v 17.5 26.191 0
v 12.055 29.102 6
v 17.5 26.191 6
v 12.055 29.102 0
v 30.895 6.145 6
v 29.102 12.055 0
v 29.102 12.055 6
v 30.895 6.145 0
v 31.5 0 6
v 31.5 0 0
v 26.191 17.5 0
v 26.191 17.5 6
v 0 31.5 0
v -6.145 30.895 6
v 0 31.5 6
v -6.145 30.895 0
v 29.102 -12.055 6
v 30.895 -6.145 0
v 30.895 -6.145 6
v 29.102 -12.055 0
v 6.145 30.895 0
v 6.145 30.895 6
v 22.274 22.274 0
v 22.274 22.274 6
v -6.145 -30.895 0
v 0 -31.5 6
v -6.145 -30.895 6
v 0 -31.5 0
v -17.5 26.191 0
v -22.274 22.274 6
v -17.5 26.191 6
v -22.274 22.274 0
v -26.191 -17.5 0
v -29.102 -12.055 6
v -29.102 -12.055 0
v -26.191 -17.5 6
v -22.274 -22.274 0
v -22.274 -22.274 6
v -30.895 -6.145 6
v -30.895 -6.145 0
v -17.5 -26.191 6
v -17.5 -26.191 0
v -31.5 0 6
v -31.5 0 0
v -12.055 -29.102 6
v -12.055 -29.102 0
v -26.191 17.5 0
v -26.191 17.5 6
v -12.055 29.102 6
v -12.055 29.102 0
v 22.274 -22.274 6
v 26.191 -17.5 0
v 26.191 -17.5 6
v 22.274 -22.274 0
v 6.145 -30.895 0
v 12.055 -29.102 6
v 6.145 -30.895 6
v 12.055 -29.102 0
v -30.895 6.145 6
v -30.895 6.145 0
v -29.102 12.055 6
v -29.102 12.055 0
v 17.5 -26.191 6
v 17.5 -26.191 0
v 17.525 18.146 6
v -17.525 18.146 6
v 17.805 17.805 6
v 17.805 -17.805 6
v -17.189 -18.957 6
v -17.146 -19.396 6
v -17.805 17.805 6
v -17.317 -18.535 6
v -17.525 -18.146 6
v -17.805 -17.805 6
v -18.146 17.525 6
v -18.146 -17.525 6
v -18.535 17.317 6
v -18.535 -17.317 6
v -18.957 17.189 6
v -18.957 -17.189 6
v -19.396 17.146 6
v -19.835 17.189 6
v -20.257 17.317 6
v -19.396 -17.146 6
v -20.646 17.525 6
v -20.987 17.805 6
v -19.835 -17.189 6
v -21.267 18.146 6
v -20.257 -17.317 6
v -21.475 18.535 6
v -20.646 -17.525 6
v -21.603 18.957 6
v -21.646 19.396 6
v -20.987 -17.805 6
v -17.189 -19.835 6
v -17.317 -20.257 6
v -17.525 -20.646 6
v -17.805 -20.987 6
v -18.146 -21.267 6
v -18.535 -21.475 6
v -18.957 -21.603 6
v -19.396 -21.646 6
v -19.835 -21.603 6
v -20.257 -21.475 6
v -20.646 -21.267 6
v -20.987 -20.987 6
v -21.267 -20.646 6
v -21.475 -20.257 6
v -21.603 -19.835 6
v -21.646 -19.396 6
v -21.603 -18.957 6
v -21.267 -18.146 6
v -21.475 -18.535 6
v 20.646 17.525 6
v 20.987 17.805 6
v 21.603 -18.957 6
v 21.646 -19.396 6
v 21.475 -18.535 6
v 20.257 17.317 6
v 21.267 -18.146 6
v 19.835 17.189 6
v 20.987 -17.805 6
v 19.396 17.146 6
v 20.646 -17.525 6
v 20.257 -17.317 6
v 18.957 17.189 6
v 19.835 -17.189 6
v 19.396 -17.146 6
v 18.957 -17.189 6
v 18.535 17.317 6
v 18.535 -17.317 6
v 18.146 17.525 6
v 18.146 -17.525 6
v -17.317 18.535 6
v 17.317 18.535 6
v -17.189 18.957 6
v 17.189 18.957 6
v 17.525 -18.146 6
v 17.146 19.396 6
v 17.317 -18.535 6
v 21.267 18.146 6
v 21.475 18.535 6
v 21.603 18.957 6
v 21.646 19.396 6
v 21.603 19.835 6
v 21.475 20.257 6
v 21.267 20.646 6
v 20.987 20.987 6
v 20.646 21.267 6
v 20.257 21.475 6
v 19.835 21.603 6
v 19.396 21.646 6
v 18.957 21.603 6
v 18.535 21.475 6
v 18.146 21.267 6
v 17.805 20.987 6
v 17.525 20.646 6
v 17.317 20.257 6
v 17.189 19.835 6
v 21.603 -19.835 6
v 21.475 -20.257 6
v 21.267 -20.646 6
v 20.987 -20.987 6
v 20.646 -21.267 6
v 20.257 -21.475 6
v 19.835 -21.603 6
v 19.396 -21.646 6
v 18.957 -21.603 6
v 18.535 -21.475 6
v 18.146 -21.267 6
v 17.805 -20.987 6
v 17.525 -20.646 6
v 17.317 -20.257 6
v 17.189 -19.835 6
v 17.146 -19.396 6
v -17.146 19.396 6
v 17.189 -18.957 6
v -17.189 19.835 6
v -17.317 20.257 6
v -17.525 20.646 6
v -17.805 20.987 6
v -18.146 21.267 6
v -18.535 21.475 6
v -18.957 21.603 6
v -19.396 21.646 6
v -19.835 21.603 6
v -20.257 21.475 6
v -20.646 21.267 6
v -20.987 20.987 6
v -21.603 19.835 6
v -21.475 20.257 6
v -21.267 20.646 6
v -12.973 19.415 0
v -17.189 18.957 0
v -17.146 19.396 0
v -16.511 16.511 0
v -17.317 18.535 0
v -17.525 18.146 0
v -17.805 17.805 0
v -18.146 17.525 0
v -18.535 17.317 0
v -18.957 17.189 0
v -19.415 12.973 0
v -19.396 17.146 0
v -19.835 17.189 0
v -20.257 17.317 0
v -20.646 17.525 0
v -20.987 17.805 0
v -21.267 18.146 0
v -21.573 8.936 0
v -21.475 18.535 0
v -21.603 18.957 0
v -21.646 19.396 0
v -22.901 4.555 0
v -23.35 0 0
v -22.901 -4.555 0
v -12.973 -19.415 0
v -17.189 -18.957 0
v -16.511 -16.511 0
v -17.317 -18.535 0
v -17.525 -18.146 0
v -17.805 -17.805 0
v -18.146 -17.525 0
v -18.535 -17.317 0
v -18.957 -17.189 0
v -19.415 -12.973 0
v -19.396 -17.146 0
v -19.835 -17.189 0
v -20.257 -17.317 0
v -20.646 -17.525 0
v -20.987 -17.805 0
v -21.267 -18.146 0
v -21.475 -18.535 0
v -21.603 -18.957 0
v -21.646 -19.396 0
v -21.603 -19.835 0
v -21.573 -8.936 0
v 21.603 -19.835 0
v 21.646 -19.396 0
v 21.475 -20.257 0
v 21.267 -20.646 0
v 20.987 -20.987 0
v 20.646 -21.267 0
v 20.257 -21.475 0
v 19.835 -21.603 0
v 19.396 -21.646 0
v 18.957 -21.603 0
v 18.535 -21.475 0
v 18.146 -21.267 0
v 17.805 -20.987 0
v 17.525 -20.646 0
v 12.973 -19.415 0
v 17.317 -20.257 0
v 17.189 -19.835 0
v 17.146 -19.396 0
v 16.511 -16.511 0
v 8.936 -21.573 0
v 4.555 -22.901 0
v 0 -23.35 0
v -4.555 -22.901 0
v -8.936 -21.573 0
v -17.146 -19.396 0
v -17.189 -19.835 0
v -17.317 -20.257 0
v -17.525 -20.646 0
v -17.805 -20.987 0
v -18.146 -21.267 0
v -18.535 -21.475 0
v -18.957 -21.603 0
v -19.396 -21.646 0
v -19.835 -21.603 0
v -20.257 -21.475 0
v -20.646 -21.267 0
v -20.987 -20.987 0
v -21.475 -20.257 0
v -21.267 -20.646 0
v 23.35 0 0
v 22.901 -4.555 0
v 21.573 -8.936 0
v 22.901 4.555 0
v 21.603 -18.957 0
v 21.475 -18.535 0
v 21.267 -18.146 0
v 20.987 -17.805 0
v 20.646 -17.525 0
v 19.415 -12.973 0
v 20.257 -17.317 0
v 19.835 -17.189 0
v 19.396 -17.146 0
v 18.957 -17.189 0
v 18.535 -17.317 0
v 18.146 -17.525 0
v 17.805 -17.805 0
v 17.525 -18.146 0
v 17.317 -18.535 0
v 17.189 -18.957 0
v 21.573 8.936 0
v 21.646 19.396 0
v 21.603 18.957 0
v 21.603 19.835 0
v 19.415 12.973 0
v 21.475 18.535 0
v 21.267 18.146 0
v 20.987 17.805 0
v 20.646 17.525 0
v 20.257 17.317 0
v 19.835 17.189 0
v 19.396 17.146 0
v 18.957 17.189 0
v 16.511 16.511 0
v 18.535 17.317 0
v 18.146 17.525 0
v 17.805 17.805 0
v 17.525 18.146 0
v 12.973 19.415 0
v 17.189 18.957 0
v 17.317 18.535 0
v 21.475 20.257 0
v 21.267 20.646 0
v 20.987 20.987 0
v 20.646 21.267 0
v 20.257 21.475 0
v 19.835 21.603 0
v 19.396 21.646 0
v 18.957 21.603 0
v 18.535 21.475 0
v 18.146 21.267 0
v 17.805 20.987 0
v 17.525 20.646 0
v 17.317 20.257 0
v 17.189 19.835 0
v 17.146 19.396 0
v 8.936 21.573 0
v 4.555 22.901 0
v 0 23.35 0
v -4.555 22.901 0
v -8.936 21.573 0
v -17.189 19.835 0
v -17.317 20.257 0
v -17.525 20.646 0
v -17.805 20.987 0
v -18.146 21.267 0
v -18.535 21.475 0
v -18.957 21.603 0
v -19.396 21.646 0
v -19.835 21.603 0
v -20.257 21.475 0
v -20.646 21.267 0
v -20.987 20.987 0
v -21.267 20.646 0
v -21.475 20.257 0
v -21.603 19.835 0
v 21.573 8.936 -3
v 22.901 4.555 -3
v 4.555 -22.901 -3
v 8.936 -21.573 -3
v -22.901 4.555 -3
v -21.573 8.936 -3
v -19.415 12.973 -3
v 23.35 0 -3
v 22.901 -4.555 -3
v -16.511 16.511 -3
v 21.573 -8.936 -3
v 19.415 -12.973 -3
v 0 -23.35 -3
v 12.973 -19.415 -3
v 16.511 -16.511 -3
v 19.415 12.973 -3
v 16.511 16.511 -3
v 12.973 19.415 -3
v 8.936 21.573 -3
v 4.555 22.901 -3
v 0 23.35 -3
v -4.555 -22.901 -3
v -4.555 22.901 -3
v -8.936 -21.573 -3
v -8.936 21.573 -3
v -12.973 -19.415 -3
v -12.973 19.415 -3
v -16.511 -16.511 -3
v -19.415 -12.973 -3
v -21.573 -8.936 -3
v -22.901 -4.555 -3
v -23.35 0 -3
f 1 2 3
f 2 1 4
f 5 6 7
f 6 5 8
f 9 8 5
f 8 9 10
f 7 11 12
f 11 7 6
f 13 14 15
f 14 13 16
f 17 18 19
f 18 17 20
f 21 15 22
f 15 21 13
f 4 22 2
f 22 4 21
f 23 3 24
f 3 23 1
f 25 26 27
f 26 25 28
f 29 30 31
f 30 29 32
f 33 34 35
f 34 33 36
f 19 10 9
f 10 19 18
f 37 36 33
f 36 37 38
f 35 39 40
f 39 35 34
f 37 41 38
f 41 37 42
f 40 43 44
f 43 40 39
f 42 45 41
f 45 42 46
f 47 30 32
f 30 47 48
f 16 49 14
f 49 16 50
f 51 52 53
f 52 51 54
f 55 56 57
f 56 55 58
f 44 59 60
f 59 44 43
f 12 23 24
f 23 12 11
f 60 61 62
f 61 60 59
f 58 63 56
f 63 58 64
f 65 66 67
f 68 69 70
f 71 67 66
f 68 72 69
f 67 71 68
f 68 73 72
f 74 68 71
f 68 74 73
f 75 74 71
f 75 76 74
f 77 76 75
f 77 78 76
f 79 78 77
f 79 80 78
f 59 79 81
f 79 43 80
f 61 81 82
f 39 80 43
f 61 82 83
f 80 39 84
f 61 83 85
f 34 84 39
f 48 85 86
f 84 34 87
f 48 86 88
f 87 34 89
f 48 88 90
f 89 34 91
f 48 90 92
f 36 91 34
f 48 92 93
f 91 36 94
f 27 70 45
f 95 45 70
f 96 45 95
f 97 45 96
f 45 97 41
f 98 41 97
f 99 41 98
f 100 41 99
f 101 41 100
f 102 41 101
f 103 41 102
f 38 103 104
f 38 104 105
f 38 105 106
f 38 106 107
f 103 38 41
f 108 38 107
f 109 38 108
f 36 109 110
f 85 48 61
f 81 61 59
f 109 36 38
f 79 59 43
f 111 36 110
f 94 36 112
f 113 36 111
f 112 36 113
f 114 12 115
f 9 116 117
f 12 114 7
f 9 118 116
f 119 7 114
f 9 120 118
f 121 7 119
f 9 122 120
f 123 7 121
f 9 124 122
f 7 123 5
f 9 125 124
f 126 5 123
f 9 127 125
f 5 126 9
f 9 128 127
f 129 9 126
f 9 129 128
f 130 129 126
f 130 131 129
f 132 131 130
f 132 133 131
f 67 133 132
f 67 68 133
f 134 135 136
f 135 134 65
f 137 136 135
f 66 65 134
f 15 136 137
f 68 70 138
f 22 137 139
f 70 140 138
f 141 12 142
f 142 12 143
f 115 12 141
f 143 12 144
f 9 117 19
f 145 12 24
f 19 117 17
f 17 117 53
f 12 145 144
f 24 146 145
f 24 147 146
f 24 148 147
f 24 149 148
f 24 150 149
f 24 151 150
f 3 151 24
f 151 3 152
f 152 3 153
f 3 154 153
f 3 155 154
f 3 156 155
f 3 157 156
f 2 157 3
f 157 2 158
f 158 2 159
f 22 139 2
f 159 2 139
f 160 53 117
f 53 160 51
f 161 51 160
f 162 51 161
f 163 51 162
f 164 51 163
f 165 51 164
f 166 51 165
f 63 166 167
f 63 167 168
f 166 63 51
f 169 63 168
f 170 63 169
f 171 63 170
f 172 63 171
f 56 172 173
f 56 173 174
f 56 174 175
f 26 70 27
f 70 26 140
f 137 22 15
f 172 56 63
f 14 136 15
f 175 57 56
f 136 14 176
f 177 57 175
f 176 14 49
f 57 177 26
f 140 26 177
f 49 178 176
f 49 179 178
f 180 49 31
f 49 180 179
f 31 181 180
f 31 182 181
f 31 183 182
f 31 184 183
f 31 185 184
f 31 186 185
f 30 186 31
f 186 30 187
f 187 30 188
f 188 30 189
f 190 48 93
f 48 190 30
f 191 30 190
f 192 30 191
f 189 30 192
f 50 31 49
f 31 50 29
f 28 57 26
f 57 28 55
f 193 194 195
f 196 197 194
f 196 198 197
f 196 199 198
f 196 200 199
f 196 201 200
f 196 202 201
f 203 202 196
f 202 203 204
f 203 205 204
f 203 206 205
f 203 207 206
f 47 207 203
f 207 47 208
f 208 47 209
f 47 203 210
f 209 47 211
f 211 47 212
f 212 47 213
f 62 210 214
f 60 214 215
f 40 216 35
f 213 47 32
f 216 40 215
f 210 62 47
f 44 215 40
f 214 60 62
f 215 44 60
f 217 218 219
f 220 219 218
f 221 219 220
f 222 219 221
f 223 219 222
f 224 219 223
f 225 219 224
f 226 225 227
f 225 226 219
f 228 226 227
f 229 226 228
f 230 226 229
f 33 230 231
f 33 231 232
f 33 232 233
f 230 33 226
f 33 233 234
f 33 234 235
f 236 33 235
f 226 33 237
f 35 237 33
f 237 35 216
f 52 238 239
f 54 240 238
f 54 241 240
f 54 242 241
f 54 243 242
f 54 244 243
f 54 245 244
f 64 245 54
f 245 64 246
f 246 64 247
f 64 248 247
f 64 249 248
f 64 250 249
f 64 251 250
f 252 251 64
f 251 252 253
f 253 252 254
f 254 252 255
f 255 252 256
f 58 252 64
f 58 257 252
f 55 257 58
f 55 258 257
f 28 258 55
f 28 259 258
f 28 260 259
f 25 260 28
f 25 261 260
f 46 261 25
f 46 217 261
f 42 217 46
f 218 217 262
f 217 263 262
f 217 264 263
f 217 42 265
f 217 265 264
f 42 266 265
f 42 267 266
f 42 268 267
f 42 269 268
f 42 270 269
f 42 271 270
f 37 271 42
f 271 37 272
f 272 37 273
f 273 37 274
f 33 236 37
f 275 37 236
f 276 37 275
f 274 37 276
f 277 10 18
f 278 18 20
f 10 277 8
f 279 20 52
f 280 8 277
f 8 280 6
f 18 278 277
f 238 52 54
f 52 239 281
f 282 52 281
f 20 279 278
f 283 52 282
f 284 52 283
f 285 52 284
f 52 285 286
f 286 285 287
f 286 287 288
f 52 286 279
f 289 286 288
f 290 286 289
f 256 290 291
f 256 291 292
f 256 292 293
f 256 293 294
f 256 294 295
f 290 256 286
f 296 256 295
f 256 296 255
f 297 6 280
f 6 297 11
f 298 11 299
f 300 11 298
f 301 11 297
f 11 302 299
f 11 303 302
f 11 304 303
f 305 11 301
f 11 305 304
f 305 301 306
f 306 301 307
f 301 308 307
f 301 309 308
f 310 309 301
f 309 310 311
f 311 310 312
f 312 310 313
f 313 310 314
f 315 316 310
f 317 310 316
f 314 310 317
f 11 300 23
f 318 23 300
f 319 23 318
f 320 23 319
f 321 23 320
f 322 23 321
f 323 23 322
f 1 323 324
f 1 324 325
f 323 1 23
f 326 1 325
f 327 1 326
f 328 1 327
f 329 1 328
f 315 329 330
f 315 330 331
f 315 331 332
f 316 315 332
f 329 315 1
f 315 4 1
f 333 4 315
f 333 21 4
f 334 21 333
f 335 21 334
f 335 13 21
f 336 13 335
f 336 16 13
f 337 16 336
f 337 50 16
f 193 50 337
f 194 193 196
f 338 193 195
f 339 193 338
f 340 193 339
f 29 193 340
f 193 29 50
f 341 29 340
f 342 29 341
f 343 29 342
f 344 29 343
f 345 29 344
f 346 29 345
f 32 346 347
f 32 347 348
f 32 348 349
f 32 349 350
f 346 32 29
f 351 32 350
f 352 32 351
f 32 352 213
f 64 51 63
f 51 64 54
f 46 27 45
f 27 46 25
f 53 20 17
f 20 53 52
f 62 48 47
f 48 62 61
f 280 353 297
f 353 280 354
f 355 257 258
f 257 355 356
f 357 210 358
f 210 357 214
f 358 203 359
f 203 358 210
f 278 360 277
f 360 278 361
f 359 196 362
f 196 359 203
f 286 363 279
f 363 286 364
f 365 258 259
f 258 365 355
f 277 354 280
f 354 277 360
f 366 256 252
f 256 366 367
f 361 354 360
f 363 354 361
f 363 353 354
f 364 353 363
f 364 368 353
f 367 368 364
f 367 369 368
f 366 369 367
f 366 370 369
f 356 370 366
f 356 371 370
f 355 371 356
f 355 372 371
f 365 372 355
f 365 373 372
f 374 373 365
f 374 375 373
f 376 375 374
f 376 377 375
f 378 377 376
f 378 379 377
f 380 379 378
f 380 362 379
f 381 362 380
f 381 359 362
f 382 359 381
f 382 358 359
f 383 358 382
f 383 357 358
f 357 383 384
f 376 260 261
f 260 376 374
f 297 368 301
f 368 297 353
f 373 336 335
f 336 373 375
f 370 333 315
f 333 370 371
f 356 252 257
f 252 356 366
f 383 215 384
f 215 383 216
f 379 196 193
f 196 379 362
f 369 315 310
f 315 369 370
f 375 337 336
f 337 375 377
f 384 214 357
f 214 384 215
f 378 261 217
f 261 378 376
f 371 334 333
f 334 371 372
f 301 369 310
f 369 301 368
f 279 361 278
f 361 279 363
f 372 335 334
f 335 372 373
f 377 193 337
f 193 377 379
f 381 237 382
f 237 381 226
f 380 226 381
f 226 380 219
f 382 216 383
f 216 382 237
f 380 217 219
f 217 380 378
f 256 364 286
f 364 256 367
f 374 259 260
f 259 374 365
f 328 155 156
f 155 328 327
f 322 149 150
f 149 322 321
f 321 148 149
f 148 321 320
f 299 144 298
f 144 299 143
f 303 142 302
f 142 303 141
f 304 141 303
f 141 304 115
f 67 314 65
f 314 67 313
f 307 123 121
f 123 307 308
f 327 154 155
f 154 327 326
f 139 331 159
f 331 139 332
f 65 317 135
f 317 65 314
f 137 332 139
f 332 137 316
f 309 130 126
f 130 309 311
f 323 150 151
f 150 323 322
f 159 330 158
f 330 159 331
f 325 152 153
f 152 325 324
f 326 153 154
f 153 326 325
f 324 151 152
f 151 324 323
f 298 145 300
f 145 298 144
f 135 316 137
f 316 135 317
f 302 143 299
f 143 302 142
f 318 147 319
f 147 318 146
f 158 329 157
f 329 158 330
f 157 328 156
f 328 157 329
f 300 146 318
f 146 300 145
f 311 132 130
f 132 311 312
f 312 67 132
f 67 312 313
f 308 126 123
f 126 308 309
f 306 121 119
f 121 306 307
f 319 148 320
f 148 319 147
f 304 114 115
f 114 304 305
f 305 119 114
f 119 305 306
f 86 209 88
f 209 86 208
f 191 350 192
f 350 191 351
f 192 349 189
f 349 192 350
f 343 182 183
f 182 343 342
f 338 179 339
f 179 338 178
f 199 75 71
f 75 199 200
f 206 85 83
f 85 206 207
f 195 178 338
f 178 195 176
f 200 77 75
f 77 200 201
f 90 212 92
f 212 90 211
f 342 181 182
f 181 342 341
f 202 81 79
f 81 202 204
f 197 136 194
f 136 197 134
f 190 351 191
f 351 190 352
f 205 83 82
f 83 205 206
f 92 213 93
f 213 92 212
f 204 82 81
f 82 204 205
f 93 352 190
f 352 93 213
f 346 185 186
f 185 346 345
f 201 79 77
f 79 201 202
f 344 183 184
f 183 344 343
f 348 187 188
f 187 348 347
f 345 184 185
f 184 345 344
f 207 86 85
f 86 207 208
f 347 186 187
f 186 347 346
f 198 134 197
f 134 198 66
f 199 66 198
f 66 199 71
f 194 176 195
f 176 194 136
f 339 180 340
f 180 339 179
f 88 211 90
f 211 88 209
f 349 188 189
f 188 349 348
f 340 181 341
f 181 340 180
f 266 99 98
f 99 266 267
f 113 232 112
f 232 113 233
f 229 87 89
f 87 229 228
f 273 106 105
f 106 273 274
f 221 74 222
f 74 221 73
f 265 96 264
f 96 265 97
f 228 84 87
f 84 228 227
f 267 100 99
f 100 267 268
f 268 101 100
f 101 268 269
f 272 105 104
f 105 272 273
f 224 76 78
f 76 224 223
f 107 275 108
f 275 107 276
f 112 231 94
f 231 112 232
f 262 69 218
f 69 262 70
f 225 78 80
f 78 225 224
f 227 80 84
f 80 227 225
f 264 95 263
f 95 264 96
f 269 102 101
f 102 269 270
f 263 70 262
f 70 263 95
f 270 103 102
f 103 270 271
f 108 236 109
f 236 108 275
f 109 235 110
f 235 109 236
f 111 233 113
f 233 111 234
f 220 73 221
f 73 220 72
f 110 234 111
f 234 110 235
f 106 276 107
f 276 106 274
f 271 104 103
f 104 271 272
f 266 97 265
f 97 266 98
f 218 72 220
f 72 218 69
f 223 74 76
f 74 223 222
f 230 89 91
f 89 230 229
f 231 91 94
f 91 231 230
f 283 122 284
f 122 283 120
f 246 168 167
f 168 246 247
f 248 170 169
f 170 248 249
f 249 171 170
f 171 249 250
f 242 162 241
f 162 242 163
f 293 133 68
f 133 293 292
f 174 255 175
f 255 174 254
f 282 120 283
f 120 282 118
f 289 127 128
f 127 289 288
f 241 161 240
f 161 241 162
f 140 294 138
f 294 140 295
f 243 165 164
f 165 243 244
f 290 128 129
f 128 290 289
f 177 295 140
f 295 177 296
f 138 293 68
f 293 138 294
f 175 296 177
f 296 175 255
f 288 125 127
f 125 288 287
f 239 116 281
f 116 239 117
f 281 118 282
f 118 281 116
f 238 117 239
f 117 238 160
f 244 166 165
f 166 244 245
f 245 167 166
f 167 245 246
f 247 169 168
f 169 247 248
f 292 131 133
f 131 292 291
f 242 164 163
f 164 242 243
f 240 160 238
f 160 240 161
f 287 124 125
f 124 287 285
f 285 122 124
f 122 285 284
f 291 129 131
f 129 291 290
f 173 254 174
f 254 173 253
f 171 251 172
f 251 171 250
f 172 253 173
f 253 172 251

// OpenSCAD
$fn = 32;

// ----------------------------------------------------------------------
// Retaining cap: 6005 cover, 63 mm, spigot 46.7 mm
// ----------------------------------------------------------------------

// --- parameters (mm) ---
cap_d = 63;               // cover diameter
cap_t = 6;                // cover thickness
lip_d = 46.7;             // spigot that enters the housing
lip_h = 3;                // spigot height
bolt_d = 4.5;             // bolt clearance
bolt_r = 27.43;           // bolt circle radius

module cover() {
  cylinder(h = cap_t, d = cap_d);
}

module spigot() {
  /* sunk 1 mm into the cover; the spigot sets the overall height */
  translate([0, 0, -lip_h]) cylinder(h = lip_h + 1, d = lip_d);
}

difference() {
  union() {
    cover();
    spigot();
  }
  for (i = [0 : 3]) rotate([0, 0, 45 + i * 90]) translate([bolt_r, 0, -lip_h - 1])
    cylinder(h = lip_h + cap_t + 2, d = bolt_d);
}
